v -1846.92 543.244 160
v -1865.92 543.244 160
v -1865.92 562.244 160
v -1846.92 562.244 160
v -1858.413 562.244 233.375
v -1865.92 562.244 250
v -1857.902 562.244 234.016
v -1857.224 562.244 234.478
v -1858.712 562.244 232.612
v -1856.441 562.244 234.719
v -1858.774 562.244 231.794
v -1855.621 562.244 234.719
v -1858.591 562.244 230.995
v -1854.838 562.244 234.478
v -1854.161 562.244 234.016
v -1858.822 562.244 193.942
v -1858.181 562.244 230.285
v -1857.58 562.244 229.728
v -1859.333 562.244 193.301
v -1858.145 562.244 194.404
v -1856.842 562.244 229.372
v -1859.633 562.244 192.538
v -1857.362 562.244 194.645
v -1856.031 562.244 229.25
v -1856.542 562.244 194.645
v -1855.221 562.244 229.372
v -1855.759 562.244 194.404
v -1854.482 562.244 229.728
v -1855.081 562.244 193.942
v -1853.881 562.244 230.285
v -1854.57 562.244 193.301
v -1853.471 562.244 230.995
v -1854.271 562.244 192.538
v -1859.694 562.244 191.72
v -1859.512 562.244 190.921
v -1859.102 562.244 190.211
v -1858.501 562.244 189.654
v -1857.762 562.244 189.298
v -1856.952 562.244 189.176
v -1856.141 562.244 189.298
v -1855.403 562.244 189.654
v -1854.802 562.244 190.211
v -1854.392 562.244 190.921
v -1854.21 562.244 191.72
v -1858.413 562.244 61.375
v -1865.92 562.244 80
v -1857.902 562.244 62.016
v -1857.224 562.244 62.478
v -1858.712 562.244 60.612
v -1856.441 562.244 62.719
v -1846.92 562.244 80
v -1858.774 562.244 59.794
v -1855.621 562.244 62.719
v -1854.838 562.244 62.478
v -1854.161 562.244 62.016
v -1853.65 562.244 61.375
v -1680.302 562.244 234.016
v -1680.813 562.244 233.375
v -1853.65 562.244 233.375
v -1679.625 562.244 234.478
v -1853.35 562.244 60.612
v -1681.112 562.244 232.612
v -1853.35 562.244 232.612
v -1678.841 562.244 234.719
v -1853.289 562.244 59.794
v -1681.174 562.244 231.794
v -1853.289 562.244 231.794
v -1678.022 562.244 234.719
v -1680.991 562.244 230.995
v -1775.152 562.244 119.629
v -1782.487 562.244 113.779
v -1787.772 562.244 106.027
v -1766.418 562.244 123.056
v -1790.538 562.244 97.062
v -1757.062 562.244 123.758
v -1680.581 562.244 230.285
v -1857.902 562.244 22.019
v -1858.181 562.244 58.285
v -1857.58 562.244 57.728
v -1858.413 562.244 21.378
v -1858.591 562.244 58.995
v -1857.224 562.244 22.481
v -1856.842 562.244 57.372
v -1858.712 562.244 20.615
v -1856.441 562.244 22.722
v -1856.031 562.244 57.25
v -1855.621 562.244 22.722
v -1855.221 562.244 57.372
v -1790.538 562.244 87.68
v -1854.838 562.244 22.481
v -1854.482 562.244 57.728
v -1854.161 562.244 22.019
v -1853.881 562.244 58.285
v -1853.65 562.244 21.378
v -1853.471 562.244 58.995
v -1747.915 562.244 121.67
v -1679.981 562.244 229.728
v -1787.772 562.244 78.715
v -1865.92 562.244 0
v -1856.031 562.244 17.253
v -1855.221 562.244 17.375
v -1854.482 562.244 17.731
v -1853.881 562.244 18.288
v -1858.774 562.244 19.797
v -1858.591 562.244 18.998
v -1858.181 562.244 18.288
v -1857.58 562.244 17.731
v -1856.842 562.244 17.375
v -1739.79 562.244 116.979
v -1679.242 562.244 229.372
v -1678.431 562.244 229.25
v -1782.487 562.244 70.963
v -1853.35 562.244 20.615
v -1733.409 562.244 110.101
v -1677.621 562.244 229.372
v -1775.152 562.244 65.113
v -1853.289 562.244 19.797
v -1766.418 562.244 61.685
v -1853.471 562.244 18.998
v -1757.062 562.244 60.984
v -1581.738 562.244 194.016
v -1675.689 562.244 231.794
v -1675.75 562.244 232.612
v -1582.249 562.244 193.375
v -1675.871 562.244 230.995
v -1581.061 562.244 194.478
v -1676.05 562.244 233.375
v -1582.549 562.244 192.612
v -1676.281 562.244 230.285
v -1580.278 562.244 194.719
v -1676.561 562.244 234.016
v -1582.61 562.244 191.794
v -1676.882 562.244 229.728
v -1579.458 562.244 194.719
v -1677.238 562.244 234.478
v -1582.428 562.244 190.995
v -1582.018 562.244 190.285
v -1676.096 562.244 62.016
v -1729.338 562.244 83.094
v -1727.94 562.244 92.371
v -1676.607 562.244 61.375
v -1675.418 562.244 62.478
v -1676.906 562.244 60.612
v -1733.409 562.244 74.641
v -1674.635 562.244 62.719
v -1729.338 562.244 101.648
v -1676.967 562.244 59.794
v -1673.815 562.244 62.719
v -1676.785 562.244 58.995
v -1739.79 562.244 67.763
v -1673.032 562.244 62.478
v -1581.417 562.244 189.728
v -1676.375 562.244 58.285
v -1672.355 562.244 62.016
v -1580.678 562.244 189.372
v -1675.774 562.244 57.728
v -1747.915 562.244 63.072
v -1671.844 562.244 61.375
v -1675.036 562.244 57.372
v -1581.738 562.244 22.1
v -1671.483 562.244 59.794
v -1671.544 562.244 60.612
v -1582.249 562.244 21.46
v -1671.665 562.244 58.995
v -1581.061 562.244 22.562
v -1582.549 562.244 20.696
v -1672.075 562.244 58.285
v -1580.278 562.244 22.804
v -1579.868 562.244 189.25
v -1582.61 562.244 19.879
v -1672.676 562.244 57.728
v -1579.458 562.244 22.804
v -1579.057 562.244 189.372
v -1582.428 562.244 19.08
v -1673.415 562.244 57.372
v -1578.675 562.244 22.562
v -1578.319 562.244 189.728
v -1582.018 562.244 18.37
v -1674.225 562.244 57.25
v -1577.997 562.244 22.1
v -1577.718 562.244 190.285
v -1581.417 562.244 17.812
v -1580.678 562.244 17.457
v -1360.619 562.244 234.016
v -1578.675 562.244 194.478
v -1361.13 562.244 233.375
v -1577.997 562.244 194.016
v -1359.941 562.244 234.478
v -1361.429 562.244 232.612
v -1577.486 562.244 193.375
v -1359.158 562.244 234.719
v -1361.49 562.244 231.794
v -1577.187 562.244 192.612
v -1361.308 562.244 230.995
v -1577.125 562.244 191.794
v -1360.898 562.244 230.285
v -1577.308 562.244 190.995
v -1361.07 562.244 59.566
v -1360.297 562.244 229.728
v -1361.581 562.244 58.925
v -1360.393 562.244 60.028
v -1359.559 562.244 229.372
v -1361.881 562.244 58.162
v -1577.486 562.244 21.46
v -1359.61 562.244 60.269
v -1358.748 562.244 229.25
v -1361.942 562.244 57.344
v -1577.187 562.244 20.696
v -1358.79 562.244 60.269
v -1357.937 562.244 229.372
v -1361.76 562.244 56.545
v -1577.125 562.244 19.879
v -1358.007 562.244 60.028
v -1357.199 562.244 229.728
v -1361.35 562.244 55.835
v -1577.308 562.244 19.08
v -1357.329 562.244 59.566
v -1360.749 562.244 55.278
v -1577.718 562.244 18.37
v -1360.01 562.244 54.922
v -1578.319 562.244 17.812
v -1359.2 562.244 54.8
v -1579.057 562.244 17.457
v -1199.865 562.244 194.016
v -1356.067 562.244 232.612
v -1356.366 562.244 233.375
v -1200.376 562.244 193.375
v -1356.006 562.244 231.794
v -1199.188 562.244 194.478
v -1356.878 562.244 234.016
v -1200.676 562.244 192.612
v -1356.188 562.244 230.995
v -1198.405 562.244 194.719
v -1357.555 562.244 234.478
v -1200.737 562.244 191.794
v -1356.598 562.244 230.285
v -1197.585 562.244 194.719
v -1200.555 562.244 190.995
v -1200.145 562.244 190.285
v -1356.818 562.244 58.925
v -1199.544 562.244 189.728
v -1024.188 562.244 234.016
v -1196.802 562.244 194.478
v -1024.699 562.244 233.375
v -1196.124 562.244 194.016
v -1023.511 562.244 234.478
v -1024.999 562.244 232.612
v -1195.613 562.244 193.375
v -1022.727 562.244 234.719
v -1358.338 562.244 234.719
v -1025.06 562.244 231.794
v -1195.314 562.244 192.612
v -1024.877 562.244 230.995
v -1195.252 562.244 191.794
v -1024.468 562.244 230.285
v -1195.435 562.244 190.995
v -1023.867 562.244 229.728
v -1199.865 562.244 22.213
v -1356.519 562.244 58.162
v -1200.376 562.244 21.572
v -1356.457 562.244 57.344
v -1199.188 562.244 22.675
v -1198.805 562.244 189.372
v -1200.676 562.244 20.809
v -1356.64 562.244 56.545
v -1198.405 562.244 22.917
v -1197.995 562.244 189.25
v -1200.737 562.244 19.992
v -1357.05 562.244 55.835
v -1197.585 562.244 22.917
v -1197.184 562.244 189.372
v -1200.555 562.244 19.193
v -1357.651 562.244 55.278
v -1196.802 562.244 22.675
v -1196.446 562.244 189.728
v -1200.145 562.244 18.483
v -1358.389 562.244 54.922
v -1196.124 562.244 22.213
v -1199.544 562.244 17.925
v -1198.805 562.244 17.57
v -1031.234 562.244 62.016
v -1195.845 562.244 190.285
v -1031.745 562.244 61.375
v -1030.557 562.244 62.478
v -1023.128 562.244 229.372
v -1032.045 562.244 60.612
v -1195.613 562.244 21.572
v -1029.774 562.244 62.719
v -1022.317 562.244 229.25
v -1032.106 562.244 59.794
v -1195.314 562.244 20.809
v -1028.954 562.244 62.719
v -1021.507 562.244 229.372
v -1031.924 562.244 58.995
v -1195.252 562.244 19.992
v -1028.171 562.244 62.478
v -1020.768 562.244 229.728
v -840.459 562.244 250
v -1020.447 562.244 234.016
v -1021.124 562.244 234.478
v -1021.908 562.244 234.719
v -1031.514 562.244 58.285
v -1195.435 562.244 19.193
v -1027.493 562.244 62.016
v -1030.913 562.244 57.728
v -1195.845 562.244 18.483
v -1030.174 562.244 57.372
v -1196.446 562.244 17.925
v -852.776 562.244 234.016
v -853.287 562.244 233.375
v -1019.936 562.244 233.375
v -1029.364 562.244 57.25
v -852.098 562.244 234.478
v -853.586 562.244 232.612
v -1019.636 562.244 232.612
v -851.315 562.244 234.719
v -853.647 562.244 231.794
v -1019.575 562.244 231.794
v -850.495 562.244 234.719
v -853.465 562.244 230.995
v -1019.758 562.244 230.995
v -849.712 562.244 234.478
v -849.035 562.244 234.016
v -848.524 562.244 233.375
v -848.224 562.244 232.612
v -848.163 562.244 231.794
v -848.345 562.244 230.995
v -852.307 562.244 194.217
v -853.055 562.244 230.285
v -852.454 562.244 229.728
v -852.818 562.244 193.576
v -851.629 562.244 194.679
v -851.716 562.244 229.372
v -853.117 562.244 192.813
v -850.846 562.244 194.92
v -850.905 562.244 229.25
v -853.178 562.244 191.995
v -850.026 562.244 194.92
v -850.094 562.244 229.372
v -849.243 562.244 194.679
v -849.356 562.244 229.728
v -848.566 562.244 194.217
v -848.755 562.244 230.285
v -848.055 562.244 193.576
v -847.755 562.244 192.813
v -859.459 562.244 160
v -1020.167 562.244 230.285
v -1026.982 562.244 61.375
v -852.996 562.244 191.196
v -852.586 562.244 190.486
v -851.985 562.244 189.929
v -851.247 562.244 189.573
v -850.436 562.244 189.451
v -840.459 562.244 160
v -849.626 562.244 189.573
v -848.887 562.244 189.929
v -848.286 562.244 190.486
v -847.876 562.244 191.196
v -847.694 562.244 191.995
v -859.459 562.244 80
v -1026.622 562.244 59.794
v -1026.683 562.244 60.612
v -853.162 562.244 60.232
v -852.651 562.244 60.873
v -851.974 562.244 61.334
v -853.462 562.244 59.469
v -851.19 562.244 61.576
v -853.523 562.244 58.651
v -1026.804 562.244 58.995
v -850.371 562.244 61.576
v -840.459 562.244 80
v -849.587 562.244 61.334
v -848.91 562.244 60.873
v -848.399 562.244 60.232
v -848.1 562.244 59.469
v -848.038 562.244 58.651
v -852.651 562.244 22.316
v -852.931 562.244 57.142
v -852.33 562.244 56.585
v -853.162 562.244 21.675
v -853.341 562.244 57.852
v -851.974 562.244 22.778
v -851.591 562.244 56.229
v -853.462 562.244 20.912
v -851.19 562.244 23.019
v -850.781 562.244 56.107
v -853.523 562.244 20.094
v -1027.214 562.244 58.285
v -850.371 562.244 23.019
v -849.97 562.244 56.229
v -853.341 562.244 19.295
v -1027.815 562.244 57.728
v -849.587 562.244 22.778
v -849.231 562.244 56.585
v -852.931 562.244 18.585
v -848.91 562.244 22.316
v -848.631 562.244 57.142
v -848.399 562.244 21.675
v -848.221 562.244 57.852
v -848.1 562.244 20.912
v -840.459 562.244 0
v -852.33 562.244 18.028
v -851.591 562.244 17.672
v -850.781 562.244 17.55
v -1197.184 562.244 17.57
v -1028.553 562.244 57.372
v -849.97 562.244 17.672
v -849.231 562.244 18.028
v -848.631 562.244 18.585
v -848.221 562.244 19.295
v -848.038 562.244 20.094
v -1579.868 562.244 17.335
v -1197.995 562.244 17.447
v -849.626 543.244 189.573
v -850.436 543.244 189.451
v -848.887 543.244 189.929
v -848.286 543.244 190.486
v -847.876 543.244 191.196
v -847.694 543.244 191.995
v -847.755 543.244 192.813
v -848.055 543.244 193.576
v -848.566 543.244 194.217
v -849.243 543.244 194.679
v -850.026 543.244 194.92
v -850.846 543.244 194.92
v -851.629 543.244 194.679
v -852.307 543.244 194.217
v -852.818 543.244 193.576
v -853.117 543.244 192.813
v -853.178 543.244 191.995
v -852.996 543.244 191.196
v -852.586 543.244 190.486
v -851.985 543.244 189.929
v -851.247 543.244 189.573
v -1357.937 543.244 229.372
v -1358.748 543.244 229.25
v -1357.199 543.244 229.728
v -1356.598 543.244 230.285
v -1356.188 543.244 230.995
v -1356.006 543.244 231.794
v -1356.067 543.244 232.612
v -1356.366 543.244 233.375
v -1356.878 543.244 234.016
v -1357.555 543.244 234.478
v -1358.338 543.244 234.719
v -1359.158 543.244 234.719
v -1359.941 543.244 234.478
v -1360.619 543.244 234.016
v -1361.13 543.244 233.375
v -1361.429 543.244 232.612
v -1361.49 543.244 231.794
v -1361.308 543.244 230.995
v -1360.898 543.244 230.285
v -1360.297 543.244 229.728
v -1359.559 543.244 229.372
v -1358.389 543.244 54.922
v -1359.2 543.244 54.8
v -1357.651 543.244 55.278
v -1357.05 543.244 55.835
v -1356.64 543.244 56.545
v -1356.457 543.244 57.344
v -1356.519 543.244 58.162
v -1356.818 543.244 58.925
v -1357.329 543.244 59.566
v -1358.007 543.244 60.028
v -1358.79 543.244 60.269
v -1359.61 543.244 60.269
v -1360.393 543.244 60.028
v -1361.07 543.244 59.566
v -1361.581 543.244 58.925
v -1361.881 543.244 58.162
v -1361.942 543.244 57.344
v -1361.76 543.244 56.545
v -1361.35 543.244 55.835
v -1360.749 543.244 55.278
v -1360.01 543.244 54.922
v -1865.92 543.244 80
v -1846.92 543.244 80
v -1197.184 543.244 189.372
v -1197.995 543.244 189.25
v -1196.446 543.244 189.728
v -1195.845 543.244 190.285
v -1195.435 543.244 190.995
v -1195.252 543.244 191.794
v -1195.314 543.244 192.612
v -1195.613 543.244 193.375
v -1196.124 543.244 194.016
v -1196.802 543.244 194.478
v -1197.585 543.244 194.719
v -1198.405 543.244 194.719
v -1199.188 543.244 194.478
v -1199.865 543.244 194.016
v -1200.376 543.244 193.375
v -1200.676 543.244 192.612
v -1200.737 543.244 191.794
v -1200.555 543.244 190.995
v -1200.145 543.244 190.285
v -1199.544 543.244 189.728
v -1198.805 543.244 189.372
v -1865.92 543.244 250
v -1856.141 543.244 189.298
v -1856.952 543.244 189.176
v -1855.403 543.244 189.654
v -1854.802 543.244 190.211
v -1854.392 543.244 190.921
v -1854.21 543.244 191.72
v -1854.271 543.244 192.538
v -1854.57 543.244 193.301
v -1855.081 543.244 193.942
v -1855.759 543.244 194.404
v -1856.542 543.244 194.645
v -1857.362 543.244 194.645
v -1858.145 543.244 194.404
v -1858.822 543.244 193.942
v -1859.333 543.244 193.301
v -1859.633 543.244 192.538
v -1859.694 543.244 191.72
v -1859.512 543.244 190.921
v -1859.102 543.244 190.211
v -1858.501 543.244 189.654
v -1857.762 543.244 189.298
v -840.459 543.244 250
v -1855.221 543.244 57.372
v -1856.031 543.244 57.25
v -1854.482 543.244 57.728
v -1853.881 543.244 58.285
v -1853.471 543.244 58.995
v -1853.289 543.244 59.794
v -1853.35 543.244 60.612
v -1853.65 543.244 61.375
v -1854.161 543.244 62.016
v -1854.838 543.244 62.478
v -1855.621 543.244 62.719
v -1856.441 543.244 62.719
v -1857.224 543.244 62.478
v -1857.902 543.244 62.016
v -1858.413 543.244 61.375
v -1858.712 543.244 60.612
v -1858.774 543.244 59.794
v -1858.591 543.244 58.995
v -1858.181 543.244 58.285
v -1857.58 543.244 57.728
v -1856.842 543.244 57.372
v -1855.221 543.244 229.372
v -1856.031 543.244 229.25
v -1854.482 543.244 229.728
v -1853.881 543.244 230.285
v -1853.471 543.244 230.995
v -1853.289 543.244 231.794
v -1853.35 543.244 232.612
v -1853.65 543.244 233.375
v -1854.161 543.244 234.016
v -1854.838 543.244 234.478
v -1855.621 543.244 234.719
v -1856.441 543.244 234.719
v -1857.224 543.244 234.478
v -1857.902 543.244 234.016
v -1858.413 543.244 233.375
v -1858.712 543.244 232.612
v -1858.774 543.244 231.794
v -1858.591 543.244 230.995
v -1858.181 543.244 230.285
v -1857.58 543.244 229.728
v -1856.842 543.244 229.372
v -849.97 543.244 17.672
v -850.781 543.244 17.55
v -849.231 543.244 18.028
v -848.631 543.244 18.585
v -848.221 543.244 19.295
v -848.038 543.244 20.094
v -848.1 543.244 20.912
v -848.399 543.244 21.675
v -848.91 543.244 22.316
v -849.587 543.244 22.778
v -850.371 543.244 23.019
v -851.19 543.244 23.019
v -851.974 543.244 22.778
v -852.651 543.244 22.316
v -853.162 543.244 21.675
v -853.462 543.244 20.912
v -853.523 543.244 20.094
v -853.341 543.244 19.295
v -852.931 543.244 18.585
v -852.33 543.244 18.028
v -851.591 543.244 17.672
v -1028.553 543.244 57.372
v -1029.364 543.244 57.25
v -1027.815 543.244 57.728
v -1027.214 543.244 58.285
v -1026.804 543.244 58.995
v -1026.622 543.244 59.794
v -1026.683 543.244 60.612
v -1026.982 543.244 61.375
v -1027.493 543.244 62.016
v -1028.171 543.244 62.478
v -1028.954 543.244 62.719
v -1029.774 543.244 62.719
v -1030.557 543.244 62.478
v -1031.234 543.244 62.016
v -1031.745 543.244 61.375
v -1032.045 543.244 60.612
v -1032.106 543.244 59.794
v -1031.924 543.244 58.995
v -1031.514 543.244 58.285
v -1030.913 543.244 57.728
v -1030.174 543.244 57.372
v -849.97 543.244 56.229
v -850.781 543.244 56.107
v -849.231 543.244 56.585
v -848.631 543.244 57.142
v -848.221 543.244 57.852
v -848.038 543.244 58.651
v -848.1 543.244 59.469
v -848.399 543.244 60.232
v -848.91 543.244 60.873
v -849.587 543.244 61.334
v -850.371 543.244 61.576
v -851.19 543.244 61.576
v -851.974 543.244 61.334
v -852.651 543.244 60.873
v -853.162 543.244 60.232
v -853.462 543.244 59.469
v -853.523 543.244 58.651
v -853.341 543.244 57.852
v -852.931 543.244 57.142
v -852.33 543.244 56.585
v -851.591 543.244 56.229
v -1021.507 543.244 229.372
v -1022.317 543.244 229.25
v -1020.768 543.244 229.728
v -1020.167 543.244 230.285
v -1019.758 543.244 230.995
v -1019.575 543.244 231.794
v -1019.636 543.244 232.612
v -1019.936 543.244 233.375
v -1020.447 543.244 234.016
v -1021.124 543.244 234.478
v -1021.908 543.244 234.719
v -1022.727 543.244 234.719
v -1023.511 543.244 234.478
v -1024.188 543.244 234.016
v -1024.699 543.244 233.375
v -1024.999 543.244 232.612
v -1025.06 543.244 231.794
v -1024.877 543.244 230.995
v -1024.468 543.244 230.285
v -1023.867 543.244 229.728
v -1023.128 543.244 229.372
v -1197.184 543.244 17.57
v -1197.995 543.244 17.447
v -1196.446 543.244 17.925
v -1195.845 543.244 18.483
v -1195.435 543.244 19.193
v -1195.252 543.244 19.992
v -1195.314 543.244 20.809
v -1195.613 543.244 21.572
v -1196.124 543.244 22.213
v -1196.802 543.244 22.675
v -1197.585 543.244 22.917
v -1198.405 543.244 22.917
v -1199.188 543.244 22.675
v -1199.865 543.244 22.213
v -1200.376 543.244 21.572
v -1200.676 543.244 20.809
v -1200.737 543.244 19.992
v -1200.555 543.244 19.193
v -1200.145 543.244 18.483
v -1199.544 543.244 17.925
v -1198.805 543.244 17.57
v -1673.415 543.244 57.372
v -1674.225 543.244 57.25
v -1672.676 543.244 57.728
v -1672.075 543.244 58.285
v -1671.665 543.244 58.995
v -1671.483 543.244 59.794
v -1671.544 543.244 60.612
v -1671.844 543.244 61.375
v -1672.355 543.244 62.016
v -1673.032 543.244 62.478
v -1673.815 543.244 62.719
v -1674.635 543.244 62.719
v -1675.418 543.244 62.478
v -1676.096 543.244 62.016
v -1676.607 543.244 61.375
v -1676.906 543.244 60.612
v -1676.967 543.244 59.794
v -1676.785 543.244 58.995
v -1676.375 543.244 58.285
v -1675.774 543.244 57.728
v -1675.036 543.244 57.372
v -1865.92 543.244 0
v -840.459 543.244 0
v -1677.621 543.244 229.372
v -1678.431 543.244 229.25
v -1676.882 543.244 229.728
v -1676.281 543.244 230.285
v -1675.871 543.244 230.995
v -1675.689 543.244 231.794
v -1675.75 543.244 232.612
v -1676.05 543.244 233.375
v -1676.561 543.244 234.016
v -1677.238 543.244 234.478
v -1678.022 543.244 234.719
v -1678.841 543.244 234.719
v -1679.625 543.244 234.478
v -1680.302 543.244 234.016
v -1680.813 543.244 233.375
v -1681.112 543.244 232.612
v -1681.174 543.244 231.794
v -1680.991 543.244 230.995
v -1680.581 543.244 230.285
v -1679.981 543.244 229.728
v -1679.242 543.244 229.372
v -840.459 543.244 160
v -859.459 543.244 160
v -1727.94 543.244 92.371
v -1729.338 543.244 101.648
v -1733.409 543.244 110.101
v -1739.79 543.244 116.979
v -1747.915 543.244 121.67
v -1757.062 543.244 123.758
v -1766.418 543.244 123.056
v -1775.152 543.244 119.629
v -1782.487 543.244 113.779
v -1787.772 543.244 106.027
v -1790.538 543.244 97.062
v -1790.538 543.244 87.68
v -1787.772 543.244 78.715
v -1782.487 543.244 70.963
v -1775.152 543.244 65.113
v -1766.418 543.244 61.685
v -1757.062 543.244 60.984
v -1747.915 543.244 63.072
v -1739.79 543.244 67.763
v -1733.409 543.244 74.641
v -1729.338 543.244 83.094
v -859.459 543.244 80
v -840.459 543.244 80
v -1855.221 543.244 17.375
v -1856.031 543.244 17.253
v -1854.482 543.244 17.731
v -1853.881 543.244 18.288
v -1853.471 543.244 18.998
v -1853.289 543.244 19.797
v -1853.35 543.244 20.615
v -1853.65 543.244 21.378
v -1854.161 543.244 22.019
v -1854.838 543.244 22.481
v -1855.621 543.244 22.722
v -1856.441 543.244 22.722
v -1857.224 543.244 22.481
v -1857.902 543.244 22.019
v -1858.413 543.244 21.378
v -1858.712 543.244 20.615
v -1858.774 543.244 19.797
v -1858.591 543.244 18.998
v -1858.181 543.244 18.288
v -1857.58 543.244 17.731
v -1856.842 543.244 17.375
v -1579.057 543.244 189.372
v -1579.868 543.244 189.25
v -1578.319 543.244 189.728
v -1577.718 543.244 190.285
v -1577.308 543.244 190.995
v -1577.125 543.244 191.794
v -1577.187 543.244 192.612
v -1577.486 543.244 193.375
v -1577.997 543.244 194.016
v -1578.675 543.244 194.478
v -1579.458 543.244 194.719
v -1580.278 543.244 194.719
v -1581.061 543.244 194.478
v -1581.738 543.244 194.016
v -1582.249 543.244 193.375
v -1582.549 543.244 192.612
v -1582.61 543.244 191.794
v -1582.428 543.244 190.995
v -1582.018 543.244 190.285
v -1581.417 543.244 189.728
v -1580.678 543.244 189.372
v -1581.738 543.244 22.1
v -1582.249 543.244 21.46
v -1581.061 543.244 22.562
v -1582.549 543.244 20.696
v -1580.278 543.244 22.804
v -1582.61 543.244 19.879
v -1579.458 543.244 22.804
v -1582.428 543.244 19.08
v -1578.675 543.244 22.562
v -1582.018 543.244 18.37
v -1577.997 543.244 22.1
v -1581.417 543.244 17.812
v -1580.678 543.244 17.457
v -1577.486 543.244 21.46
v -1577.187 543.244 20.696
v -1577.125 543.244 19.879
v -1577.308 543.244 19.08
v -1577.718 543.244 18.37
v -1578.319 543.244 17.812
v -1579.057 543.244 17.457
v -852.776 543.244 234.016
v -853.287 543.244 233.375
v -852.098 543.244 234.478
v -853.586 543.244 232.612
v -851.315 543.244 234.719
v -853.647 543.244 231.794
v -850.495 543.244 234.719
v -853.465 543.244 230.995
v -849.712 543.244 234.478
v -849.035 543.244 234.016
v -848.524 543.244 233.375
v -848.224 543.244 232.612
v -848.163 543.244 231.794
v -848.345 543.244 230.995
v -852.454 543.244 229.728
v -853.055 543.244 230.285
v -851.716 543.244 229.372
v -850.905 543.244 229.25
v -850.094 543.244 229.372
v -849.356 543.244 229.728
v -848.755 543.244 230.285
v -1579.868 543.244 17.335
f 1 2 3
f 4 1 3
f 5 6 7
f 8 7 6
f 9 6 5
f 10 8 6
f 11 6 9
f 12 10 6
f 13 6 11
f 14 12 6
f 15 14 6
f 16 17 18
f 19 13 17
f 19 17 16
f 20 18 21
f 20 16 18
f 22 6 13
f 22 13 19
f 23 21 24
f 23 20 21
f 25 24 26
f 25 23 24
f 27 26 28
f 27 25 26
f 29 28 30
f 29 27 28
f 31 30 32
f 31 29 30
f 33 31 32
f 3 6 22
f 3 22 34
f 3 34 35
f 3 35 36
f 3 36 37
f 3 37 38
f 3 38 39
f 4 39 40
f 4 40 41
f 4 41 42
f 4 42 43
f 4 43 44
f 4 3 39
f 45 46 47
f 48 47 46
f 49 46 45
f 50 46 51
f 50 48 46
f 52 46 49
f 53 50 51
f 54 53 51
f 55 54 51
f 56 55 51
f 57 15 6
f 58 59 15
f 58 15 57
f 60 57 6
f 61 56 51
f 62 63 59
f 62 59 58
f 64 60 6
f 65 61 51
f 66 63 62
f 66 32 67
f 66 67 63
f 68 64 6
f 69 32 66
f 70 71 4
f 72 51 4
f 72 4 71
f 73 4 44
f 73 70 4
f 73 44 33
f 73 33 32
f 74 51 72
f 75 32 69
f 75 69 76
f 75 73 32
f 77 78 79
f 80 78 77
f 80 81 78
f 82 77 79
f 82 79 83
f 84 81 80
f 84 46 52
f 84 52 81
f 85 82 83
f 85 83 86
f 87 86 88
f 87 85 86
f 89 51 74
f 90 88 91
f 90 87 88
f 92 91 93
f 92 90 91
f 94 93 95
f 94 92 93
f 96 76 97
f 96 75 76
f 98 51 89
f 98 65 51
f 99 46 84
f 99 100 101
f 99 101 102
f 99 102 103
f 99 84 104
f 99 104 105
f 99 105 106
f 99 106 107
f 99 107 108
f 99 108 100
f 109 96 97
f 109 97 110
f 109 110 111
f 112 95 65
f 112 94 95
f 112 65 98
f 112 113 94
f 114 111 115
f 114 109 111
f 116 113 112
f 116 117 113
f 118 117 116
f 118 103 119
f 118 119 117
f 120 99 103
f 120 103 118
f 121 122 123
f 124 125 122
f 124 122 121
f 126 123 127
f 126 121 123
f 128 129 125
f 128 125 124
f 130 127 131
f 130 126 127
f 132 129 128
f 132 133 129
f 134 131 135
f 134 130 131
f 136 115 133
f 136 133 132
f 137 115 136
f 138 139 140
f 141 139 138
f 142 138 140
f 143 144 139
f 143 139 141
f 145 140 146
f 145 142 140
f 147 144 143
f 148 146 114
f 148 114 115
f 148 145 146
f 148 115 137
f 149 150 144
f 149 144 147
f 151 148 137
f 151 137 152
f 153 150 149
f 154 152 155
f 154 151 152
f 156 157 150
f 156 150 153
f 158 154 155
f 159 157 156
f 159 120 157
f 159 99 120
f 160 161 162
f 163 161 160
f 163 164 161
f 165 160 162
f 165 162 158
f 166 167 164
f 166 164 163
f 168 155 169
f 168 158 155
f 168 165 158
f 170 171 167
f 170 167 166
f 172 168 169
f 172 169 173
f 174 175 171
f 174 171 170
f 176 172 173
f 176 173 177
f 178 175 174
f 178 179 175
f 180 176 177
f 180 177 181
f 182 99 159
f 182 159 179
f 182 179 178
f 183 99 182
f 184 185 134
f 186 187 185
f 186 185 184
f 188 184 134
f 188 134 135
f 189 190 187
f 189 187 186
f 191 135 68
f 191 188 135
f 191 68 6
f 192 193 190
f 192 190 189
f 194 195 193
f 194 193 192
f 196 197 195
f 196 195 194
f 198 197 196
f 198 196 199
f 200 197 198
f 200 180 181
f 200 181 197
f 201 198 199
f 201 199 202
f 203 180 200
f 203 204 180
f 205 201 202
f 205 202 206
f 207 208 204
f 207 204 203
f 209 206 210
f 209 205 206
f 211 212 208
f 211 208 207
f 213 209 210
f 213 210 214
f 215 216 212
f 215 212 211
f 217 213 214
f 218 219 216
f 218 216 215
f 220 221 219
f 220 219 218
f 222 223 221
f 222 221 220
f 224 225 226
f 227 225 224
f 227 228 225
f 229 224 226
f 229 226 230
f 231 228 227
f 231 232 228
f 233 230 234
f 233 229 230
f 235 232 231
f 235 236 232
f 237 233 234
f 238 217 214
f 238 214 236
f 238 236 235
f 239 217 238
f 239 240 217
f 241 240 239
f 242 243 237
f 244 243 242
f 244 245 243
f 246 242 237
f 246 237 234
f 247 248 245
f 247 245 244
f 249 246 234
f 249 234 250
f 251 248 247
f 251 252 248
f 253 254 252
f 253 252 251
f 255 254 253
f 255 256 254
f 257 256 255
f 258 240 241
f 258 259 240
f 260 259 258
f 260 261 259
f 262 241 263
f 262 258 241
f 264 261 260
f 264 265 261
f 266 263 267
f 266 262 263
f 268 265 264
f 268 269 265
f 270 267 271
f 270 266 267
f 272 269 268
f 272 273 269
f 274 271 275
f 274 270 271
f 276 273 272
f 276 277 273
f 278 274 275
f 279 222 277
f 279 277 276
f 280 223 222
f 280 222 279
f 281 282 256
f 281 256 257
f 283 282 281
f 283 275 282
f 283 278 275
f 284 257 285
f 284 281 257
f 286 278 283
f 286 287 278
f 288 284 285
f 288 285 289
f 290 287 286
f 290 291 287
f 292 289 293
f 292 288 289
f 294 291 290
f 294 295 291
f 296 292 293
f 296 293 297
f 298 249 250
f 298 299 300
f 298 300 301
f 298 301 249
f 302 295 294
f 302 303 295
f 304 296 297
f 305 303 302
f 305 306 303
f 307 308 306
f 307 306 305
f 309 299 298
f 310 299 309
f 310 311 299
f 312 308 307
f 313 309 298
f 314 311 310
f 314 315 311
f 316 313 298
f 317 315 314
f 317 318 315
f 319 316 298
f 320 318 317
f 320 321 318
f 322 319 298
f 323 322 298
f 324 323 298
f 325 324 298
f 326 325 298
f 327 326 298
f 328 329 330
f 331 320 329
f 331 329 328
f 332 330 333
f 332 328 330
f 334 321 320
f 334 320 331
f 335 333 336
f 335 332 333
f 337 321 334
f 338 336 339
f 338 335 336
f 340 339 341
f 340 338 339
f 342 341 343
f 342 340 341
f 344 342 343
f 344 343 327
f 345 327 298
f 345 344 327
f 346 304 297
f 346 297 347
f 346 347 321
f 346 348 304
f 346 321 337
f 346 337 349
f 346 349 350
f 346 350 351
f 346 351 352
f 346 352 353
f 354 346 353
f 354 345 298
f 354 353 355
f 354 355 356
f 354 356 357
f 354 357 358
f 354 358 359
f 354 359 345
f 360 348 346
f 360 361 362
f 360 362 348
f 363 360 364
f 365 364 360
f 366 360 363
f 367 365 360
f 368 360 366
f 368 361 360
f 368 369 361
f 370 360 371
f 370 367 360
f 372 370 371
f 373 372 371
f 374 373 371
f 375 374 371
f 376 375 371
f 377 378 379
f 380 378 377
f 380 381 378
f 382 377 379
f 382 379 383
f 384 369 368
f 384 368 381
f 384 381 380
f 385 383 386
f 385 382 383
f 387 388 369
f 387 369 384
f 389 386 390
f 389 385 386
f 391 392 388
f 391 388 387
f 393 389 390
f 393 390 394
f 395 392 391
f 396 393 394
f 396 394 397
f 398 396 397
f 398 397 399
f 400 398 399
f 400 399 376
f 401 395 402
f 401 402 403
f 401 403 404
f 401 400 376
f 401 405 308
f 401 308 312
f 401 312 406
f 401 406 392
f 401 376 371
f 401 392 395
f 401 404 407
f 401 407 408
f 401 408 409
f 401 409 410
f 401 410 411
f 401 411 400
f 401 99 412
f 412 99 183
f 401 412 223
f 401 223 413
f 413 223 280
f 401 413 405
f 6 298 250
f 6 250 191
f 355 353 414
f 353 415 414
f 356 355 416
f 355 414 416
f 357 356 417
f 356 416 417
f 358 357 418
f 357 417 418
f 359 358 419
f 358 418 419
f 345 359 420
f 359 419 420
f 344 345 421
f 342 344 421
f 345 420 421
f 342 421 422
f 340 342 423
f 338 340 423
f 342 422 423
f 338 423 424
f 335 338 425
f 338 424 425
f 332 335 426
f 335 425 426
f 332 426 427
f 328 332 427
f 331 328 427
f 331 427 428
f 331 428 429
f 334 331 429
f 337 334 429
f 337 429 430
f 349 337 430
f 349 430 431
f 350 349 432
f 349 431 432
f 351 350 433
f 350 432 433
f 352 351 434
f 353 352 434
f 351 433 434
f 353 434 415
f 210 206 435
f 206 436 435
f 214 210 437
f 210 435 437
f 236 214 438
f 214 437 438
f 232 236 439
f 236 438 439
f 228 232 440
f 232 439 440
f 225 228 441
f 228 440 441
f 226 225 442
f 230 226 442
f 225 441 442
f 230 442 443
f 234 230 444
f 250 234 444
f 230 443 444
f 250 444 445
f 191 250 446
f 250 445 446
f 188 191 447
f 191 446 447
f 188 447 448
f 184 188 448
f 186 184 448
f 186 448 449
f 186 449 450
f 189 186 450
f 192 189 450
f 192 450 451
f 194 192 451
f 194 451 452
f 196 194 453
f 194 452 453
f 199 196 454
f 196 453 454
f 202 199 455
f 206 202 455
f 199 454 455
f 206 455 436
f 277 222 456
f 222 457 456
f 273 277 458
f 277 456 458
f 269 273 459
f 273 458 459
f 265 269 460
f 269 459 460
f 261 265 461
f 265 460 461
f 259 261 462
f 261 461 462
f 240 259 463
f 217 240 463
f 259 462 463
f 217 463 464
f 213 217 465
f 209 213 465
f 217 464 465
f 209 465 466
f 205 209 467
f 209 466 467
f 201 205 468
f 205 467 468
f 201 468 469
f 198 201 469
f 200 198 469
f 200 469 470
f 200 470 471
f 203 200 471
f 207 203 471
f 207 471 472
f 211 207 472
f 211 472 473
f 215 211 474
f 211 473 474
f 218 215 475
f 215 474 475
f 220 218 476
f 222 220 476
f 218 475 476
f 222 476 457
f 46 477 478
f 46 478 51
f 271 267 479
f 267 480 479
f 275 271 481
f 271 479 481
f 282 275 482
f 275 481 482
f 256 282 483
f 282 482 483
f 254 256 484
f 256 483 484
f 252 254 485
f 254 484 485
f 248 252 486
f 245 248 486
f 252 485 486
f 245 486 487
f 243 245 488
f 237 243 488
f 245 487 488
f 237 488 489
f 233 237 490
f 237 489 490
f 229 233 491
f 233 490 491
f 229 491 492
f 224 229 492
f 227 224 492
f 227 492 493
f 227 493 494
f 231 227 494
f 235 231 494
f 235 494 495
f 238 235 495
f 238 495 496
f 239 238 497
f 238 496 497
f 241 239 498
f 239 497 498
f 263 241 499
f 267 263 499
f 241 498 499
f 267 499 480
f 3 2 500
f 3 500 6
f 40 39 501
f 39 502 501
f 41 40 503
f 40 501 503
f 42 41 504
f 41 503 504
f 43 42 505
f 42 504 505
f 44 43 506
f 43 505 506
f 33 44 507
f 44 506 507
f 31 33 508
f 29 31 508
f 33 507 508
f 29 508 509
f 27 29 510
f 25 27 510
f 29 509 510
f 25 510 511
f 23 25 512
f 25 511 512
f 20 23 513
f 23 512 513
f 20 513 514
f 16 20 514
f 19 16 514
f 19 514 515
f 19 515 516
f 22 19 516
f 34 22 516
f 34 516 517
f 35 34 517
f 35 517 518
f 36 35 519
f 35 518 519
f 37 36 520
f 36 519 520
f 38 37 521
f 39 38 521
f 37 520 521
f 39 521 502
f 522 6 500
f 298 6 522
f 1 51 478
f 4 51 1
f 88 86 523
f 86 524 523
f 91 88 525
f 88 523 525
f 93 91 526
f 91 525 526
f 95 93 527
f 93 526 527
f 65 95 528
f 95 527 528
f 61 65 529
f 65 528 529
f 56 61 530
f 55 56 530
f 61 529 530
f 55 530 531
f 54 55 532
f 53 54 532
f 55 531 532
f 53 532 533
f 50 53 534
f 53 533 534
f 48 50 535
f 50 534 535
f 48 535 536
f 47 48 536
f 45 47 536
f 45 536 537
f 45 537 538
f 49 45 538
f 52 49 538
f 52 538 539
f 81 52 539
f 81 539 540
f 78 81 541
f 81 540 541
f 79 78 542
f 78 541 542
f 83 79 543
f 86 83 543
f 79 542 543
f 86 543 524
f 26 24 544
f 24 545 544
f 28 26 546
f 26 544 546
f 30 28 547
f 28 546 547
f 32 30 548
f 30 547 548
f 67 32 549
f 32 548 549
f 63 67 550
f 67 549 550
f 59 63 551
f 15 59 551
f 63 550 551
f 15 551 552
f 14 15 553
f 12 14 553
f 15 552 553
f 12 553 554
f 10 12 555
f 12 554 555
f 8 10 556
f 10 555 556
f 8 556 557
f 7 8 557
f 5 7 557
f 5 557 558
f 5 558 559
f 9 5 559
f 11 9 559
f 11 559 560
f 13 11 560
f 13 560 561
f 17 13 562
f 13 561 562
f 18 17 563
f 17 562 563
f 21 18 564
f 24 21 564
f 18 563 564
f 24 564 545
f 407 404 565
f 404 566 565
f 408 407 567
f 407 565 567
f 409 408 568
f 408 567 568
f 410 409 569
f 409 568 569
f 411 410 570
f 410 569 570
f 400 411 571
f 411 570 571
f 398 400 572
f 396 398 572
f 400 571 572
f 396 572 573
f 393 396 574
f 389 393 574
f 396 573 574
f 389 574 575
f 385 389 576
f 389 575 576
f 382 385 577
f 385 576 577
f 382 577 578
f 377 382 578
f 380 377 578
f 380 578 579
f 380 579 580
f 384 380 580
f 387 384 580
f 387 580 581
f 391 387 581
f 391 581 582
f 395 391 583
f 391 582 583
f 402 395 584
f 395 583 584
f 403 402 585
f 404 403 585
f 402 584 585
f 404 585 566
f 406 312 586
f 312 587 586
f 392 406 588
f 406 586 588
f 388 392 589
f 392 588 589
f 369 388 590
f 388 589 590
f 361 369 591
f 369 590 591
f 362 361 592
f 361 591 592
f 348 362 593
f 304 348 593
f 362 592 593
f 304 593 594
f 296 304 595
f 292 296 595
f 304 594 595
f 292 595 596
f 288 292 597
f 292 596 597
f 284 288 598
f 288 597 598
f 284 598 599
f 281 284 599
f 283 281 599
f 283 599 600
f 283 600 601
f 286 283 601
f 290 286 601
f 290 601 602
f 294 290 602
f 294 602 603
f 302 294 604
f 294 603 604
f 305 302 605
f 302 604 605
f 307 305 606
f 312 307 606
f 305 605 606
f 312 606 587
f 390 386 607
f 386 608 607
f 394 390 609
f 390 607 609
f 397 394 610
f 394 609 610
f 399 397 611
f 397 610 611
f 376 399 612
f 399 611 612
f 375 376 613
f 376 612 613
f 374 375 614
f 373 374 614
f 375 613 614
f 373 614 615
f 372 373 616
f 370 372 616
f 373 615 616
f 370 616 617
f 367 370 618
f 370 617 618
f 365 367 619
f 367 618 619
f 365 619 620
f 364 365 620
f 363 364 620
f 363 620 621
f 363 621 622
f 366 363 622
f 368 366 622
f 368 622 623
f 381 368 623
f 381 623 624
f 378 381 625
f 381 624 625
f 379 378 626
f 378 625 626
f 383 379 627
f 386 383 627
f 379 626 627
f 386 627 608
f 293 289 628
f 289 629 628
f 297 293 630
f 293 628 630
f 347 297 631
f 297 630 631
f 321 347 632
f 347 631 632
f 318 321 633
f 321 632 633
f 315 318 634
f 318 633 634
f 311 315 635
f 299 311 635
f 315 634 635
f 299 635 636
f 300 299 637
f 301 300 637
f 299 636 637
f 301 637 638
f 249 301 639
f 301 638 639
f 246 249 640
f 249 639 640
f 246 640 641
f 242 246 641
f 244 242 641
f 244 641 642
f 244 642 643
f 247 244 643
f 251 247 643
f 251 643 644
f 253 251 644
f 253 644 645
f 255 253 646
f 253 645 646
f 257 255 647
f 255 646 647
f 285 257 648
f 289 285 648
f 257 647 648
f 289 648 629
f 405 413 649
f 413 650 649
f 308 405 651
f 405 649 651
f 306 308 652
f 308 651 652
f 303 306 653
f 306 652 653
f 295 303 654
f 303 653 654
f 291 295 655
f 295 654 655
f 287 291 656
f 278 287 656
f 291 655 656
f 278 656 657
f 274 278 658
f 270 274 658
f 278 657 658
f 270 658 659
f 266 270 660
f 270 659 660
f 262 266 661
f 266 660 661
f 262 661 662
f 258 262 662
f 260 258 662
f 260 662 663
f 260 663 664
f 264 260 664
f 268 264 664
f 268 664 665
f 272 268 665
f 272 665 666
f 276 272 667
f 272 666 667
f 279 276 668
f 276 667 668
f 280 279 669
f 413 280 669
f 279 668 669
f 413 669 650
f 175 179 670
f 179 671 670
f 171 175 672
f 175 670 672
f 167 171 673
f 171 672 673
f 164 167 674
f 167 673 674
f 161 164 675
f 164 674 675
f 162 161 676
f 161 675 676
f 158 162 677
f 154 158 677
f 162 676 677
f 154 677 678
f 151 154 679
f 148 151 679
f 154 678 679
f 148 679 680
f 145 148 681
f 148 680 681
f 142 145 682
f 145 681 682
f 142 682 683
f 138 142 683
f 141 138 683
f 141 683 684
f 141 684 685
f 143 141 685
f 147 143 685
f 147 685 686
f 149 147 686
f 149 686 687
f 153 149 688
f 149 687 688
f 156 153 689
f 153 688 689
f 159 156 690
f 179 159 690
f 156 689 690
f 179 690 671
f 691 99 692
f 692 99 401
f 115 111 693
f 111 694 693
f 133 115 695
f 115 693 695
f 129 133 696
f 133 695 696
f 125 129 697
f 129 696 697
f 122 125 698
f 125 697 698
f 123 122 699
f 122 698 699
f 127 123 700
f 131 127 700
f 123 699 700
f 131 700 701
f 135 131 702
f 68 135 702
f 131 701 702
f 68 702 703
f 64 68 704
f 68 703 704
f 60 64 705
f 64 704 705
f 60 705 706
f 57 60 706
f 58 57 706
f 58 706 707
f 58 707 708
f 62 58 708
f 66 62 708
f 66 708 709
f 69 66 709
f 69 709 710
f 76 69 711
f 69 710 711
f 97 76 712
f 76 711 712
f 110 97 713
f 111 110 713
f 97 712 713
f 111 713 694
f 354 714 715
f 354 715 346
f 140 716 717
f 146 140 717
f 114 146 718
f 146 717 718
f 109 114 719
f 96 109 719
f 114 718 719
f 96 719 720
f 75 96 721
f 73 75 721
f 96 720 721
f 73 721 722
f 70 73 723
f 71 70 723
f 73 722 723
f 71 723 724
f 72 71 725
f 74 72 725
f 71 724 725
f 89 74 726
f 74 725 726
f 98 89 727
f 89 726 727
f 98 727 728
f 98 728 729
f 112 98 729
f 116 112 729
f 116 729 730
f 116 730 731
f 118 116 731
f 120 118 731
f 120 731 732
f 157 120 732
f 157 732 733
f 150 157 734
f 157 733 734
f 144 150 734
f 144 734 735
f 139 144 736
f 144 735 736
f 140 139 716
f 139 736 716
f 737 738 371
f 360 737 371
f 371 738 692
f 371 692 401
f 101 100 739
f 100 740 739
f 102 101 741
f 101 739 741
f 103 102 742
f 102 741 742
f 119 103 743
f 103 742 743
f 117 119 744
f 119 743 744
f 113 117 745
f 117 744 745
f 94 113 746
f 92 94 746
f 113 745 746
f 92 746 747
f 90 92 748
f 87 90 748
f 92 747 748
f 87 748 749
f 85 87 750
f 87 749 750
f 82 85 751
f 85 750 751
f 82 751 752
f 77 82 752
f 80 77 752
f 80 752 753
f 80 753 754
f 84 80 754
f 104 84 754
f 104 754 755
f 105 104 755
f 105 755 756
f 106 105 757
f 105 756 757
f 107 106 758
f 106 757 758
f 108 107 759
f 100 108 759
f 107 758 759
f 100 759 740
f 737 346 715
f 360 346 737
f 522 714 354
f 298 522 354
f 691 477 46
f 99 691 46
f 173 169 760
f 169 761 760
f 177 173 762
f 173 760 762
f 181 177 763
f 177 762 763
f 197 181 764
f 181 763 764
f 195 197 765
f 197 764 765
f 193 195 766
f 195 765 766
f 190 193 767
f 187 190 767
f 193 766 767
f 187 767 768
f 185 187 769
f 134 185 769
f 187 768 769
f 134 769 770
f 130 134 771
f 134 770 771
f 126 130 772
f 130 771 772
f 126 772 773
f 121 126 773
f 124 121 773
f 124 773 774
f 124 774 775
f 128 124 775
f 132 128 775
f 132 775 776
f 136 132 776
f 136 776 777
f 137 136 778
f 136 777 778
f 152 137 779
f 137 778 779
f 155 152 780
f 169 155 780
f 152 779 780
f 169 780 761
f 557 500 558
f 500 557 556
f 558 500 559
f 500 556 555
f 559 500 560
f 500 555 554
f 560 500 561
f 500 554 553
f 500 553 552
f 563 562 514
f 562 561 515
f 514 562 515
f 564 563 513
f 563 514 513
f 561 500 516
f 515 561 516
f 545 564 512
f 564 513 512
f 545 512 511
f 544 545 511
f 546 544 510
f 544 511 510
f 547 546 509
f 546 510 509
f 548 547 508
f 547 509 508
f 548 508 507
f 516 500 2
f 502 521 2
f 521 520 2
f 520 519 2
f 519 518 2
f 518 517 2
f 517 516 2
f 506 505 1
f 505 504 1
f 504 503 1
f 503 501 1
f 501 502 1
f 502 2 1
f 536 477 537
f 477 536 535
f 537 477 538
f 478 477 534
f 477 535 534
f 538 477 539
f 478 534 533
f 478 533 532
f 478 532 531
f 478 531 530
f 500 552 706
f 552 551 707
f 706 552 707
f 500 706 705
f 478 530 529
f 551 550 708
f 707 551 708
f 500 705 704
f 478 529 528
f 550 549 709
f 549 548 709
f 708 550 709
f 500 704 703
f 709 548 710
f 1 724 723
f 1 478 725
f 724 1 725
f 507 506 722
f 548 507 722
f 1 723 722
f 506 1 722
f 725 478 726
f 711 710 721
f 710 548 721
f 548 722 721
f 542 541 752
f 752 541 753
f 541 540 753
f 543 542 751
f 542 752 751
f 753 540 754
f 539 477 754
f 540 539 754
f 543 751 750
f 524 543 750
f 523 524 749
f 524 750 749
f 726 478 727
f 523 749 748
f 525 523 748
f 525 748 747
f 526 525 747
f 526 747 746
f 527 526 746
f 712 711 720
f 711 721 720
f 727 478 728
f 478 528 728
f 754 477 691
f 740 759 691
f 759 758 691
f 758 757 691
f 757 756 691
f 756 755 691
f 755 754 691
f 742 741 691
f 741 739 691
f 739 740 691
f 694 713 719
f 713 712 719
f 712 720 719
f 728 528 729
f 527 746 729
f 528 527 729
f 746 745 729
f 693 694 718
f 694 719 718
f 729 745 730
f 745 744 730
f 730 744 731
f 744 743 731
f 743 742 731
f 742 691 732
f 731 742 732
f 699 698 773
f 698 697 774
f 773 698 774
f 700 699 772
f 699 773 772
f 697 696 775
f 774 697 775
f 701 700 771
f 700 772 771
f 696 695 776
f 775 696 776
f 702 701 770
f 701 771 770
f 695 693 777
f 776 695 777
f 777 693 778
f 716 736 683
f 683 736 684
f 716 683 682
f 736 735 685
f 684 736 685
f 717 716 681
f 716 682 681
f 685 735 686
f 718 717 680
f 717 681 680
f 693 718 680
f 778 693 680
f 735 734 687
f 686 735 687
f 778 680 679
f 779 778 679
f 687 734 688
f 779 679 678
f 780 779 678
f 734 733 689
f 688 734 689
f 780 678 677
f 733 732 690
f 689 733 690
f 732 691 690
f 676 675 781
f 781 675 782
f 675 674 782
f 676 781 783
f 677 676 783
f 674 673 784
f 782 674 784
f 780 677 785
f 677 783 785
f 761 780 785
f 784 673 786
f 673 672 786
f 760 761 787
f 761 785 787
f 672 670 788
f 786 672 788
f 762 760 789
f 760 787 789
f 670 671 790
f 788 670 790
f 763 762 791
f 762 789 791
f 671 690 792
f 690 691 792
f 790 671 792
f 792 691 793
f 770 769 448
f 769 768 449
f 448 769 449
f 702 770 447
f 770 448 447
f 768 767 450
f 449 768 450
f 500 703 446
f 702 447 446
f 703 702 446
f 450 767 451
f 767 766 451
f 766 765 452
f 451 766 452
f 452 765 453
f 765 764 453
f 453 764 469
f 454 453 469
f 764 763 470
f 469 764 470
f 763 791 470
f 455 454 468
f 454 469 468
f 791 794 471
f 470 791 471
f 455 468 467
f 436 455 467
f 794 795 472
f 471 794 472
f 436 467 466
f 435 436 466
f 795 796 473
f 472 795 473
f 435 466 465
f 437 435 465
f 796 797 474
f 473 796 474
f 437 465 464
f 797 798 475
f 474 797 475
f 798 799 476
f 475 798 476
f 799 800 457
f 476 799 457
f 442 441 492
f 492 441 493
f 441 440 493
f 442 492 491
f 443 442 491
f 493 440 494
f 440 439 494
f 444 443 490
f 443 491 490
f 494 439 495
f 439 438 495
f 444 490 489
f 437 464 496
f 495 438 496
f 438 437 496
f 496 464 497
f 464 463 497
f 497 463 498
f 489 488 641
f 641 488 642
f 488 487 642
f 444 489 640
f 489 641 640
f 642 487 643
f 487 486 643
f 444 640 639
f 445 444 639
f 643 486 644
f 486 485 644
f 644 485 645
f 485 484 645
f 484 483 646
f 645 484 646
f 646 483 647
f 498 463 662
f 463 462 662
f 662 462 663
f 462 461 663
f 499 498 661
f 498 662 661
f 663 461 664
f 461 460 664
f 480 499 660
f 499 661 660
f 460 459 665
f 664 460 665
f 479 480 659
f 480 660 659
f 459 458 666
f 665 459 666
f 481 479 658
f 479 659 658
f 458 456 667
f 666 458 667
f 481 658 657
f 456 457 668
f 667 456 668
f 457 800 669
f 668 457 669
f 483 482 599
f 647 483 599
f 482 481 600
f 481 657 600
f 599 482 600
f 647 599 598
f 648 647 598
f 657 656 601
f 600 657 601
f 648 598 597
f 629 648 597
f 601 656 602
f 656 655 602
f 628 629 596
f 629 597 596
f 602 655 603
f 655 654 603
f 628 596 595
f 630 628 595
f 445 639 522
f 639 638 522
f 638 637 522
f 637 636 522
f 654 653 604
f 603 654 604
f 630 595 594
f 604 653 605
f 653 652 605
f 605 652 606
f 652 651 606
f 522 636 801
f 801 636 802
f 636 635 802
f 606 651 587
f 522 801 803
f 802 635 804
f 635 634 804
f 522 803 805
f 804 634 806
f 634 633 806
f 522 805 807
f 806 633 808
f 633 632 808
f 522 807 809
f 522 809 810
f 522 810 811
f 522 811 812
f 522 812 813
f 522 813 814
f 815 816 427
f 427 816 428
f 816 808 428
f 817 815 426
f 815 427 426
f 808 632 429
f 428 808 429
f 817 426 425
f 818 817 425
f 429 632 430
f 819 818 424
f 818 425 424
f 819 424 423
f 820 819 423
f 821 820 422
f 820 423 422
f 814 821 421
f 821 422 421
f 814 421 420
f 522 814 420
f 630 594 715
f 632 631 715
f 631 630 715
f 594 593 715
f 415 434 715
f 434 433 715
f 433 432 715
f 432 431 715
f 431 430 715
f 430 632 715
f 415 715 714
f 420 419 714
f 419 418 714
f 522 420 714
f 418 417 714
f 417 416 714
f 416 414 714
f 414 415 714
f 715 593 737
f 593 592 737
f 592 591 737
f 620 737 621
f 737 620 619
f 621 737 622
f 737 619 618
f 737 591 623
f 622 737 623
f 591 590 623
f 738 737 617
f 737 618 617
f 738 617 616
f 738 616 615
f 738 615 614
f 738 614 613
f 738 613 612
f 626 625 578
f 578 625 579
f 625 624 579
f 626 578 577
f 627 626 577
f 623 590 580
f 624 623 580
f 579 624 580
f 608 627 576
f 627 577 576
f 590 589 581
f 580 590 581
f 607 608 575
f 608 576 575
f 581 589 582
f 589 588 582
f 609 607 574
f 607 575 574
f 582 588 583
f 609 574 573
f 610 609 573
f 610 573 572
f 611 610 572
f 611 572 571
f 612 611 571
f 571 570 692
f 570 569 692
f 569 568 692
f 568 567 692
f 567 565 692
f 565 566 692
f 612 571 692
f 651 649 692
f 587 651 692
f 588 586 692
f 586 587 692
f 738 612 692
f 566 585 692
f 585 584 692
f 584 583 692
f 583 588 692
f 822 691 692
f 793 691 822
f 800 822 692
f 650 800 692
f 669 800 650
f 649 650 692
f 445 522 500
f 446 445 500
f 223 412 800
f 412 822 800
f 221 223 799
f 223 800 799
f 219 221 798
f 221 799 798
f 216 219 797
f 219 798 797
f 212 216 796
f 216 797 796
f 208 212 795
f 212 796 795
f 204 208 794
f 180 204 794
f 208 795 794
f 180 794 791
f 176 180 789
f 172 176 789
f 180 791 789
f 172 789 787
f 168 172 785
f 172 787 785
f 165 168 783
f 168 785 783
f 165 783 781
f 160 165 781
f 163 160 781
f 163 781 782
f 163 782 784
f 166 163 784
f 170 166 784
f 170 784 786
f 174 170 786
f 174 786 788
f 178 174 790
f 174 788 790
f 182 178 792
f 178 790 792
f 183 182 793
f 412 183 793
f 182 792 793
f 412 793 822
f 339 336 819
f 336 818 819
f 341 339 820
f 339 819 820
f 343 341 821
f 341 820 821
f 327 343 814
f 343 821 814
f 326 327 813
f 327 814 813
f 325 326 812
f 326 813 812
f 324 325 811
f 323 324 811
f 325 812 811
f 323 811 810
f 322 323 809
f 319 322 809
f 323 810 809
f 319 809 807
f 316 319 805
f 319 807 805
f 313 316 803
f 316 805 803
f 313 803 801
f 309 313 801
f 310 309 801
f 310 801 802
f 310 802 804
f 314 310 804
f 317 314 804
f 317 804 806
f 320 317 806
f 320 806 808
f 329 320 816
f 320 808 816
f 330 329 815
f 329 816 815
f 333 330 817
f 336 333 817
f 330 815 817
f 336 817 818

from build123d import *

# Parameters (mm, degrees)
SKETCH1_W                = 1025.461280364
SKETCH1_H                = 19
BOSS_EXTRUDE1_DEPTH      = 250
SKETCH2_R                = 31.474645295
CUT_EXTRUDE1_DEPTH       = 19
SKETCH3_W                = 80
SKETCH3_H                = 19
CUT_EXTRUDE2_DEPTH       = 19
SKETCH4_W                = 80
SKETCH4_H                = 19
CUT_EXTRUDE3_DEPTH       = 19
M5_CLEARANCE_HOLE2_D     = 5.5
M5_CLEARANCE_HOLE2_DEPTH = 19
M5_CLEARANCE_HOLE2_TIP   = 1.652366702


with BuildPart() as part:
    # Sketch1 → Boss-Extrude1 (new body)
    with BuildSketch(Plane.XY):
        with Locations((-1353.189241506, 552.74355083)):
            Rectangle(SKETCH1_W, SKETCH1_H)
    extrude(amount=BOSS_EXTRUDE1_DEPTH)

    # Sketch2 → Cut-Extrude1 (cut)
    with BuildSketch(Plane.XZ.offset(-543.24355083)):
        with Locations((-1759.414463941, 92.370881147)):
            Circle(SKETCH2_R)
    extrude(amount=-CUT_EXTRUDE1_DEPTH, mode=Mode.SUBTRACT)

    # Sketch3 → Cut-Extrude2 (cut)
    with BuildSketch(Plane(origin=(-840.458601324, 0, 0), x_dir=(0, 0, -1), z_dir=(1, 0, 0))):
        with Locations((-120, 552.74355083)):
            Rectangle(SKETCH3_W, SKETCH3_H)
    extrude(amount=-CUT_EXTRUDE2_DEPTH, mode=Mode.SUBTRACT)

    # Sketch4 → Cut-Extrude3 (cut)
    with BuildSketch(Plane.ZY.offset(1865.919881688)):
        with Locations((120, 552.74355083)):
            Rectangle(SKETCH4_W, SKETCH4_H)
    extrude(amount=-CUT_EXTRUDE3_DEPTH, mode=Mode.SUBTRACT)

    # M5 Clearance Hole2
    with Locations(Plane(origin=(-850.780626104, 562.24355083, 20.3), x_dir=(0, 0, 1), z_dir=(0, 1, 0))):
        with Locations((0, 0), (39.7, -178.583190579), (-0.102610802, -347.214178794), (37.25, -508.419165524), (-0.215464176, -729.087144166), (171.700000001, -729.087144166), (171.700000001, -347.214178794), (211.700000001, -171.536855259), (211.700000001, -0.124443922), (211.700000001, -507.967423392), (211.700000001, -827.650747254), (211.700000001, -1005.250659284), (-0.297077663, -1005.250659284), (39.7, -1005.250659284), (38.556814399, 0), (39.7, -823.444523141), (171.625882032, -1006.171227911), (171.900966052, 0.344520361)):
            Hole(M5_CLEARANCE_HOLE2_D / 2, depth=M5_CLEARANCE_HOLE2_DEPTH)
            with Locations((0, 0, -(M5_CLEARANCE_HOLE2_DEPTH + M5_CLEARANCE_HOLE2_TIP / 2))):  # 118° drill point
                Cone(0, M5_CLEARANCE_HOLE2_D / 2, M5_CLEARANCE_HOLE2_TIP, mode=Mode.SUBTRACT)


solid = part.part
